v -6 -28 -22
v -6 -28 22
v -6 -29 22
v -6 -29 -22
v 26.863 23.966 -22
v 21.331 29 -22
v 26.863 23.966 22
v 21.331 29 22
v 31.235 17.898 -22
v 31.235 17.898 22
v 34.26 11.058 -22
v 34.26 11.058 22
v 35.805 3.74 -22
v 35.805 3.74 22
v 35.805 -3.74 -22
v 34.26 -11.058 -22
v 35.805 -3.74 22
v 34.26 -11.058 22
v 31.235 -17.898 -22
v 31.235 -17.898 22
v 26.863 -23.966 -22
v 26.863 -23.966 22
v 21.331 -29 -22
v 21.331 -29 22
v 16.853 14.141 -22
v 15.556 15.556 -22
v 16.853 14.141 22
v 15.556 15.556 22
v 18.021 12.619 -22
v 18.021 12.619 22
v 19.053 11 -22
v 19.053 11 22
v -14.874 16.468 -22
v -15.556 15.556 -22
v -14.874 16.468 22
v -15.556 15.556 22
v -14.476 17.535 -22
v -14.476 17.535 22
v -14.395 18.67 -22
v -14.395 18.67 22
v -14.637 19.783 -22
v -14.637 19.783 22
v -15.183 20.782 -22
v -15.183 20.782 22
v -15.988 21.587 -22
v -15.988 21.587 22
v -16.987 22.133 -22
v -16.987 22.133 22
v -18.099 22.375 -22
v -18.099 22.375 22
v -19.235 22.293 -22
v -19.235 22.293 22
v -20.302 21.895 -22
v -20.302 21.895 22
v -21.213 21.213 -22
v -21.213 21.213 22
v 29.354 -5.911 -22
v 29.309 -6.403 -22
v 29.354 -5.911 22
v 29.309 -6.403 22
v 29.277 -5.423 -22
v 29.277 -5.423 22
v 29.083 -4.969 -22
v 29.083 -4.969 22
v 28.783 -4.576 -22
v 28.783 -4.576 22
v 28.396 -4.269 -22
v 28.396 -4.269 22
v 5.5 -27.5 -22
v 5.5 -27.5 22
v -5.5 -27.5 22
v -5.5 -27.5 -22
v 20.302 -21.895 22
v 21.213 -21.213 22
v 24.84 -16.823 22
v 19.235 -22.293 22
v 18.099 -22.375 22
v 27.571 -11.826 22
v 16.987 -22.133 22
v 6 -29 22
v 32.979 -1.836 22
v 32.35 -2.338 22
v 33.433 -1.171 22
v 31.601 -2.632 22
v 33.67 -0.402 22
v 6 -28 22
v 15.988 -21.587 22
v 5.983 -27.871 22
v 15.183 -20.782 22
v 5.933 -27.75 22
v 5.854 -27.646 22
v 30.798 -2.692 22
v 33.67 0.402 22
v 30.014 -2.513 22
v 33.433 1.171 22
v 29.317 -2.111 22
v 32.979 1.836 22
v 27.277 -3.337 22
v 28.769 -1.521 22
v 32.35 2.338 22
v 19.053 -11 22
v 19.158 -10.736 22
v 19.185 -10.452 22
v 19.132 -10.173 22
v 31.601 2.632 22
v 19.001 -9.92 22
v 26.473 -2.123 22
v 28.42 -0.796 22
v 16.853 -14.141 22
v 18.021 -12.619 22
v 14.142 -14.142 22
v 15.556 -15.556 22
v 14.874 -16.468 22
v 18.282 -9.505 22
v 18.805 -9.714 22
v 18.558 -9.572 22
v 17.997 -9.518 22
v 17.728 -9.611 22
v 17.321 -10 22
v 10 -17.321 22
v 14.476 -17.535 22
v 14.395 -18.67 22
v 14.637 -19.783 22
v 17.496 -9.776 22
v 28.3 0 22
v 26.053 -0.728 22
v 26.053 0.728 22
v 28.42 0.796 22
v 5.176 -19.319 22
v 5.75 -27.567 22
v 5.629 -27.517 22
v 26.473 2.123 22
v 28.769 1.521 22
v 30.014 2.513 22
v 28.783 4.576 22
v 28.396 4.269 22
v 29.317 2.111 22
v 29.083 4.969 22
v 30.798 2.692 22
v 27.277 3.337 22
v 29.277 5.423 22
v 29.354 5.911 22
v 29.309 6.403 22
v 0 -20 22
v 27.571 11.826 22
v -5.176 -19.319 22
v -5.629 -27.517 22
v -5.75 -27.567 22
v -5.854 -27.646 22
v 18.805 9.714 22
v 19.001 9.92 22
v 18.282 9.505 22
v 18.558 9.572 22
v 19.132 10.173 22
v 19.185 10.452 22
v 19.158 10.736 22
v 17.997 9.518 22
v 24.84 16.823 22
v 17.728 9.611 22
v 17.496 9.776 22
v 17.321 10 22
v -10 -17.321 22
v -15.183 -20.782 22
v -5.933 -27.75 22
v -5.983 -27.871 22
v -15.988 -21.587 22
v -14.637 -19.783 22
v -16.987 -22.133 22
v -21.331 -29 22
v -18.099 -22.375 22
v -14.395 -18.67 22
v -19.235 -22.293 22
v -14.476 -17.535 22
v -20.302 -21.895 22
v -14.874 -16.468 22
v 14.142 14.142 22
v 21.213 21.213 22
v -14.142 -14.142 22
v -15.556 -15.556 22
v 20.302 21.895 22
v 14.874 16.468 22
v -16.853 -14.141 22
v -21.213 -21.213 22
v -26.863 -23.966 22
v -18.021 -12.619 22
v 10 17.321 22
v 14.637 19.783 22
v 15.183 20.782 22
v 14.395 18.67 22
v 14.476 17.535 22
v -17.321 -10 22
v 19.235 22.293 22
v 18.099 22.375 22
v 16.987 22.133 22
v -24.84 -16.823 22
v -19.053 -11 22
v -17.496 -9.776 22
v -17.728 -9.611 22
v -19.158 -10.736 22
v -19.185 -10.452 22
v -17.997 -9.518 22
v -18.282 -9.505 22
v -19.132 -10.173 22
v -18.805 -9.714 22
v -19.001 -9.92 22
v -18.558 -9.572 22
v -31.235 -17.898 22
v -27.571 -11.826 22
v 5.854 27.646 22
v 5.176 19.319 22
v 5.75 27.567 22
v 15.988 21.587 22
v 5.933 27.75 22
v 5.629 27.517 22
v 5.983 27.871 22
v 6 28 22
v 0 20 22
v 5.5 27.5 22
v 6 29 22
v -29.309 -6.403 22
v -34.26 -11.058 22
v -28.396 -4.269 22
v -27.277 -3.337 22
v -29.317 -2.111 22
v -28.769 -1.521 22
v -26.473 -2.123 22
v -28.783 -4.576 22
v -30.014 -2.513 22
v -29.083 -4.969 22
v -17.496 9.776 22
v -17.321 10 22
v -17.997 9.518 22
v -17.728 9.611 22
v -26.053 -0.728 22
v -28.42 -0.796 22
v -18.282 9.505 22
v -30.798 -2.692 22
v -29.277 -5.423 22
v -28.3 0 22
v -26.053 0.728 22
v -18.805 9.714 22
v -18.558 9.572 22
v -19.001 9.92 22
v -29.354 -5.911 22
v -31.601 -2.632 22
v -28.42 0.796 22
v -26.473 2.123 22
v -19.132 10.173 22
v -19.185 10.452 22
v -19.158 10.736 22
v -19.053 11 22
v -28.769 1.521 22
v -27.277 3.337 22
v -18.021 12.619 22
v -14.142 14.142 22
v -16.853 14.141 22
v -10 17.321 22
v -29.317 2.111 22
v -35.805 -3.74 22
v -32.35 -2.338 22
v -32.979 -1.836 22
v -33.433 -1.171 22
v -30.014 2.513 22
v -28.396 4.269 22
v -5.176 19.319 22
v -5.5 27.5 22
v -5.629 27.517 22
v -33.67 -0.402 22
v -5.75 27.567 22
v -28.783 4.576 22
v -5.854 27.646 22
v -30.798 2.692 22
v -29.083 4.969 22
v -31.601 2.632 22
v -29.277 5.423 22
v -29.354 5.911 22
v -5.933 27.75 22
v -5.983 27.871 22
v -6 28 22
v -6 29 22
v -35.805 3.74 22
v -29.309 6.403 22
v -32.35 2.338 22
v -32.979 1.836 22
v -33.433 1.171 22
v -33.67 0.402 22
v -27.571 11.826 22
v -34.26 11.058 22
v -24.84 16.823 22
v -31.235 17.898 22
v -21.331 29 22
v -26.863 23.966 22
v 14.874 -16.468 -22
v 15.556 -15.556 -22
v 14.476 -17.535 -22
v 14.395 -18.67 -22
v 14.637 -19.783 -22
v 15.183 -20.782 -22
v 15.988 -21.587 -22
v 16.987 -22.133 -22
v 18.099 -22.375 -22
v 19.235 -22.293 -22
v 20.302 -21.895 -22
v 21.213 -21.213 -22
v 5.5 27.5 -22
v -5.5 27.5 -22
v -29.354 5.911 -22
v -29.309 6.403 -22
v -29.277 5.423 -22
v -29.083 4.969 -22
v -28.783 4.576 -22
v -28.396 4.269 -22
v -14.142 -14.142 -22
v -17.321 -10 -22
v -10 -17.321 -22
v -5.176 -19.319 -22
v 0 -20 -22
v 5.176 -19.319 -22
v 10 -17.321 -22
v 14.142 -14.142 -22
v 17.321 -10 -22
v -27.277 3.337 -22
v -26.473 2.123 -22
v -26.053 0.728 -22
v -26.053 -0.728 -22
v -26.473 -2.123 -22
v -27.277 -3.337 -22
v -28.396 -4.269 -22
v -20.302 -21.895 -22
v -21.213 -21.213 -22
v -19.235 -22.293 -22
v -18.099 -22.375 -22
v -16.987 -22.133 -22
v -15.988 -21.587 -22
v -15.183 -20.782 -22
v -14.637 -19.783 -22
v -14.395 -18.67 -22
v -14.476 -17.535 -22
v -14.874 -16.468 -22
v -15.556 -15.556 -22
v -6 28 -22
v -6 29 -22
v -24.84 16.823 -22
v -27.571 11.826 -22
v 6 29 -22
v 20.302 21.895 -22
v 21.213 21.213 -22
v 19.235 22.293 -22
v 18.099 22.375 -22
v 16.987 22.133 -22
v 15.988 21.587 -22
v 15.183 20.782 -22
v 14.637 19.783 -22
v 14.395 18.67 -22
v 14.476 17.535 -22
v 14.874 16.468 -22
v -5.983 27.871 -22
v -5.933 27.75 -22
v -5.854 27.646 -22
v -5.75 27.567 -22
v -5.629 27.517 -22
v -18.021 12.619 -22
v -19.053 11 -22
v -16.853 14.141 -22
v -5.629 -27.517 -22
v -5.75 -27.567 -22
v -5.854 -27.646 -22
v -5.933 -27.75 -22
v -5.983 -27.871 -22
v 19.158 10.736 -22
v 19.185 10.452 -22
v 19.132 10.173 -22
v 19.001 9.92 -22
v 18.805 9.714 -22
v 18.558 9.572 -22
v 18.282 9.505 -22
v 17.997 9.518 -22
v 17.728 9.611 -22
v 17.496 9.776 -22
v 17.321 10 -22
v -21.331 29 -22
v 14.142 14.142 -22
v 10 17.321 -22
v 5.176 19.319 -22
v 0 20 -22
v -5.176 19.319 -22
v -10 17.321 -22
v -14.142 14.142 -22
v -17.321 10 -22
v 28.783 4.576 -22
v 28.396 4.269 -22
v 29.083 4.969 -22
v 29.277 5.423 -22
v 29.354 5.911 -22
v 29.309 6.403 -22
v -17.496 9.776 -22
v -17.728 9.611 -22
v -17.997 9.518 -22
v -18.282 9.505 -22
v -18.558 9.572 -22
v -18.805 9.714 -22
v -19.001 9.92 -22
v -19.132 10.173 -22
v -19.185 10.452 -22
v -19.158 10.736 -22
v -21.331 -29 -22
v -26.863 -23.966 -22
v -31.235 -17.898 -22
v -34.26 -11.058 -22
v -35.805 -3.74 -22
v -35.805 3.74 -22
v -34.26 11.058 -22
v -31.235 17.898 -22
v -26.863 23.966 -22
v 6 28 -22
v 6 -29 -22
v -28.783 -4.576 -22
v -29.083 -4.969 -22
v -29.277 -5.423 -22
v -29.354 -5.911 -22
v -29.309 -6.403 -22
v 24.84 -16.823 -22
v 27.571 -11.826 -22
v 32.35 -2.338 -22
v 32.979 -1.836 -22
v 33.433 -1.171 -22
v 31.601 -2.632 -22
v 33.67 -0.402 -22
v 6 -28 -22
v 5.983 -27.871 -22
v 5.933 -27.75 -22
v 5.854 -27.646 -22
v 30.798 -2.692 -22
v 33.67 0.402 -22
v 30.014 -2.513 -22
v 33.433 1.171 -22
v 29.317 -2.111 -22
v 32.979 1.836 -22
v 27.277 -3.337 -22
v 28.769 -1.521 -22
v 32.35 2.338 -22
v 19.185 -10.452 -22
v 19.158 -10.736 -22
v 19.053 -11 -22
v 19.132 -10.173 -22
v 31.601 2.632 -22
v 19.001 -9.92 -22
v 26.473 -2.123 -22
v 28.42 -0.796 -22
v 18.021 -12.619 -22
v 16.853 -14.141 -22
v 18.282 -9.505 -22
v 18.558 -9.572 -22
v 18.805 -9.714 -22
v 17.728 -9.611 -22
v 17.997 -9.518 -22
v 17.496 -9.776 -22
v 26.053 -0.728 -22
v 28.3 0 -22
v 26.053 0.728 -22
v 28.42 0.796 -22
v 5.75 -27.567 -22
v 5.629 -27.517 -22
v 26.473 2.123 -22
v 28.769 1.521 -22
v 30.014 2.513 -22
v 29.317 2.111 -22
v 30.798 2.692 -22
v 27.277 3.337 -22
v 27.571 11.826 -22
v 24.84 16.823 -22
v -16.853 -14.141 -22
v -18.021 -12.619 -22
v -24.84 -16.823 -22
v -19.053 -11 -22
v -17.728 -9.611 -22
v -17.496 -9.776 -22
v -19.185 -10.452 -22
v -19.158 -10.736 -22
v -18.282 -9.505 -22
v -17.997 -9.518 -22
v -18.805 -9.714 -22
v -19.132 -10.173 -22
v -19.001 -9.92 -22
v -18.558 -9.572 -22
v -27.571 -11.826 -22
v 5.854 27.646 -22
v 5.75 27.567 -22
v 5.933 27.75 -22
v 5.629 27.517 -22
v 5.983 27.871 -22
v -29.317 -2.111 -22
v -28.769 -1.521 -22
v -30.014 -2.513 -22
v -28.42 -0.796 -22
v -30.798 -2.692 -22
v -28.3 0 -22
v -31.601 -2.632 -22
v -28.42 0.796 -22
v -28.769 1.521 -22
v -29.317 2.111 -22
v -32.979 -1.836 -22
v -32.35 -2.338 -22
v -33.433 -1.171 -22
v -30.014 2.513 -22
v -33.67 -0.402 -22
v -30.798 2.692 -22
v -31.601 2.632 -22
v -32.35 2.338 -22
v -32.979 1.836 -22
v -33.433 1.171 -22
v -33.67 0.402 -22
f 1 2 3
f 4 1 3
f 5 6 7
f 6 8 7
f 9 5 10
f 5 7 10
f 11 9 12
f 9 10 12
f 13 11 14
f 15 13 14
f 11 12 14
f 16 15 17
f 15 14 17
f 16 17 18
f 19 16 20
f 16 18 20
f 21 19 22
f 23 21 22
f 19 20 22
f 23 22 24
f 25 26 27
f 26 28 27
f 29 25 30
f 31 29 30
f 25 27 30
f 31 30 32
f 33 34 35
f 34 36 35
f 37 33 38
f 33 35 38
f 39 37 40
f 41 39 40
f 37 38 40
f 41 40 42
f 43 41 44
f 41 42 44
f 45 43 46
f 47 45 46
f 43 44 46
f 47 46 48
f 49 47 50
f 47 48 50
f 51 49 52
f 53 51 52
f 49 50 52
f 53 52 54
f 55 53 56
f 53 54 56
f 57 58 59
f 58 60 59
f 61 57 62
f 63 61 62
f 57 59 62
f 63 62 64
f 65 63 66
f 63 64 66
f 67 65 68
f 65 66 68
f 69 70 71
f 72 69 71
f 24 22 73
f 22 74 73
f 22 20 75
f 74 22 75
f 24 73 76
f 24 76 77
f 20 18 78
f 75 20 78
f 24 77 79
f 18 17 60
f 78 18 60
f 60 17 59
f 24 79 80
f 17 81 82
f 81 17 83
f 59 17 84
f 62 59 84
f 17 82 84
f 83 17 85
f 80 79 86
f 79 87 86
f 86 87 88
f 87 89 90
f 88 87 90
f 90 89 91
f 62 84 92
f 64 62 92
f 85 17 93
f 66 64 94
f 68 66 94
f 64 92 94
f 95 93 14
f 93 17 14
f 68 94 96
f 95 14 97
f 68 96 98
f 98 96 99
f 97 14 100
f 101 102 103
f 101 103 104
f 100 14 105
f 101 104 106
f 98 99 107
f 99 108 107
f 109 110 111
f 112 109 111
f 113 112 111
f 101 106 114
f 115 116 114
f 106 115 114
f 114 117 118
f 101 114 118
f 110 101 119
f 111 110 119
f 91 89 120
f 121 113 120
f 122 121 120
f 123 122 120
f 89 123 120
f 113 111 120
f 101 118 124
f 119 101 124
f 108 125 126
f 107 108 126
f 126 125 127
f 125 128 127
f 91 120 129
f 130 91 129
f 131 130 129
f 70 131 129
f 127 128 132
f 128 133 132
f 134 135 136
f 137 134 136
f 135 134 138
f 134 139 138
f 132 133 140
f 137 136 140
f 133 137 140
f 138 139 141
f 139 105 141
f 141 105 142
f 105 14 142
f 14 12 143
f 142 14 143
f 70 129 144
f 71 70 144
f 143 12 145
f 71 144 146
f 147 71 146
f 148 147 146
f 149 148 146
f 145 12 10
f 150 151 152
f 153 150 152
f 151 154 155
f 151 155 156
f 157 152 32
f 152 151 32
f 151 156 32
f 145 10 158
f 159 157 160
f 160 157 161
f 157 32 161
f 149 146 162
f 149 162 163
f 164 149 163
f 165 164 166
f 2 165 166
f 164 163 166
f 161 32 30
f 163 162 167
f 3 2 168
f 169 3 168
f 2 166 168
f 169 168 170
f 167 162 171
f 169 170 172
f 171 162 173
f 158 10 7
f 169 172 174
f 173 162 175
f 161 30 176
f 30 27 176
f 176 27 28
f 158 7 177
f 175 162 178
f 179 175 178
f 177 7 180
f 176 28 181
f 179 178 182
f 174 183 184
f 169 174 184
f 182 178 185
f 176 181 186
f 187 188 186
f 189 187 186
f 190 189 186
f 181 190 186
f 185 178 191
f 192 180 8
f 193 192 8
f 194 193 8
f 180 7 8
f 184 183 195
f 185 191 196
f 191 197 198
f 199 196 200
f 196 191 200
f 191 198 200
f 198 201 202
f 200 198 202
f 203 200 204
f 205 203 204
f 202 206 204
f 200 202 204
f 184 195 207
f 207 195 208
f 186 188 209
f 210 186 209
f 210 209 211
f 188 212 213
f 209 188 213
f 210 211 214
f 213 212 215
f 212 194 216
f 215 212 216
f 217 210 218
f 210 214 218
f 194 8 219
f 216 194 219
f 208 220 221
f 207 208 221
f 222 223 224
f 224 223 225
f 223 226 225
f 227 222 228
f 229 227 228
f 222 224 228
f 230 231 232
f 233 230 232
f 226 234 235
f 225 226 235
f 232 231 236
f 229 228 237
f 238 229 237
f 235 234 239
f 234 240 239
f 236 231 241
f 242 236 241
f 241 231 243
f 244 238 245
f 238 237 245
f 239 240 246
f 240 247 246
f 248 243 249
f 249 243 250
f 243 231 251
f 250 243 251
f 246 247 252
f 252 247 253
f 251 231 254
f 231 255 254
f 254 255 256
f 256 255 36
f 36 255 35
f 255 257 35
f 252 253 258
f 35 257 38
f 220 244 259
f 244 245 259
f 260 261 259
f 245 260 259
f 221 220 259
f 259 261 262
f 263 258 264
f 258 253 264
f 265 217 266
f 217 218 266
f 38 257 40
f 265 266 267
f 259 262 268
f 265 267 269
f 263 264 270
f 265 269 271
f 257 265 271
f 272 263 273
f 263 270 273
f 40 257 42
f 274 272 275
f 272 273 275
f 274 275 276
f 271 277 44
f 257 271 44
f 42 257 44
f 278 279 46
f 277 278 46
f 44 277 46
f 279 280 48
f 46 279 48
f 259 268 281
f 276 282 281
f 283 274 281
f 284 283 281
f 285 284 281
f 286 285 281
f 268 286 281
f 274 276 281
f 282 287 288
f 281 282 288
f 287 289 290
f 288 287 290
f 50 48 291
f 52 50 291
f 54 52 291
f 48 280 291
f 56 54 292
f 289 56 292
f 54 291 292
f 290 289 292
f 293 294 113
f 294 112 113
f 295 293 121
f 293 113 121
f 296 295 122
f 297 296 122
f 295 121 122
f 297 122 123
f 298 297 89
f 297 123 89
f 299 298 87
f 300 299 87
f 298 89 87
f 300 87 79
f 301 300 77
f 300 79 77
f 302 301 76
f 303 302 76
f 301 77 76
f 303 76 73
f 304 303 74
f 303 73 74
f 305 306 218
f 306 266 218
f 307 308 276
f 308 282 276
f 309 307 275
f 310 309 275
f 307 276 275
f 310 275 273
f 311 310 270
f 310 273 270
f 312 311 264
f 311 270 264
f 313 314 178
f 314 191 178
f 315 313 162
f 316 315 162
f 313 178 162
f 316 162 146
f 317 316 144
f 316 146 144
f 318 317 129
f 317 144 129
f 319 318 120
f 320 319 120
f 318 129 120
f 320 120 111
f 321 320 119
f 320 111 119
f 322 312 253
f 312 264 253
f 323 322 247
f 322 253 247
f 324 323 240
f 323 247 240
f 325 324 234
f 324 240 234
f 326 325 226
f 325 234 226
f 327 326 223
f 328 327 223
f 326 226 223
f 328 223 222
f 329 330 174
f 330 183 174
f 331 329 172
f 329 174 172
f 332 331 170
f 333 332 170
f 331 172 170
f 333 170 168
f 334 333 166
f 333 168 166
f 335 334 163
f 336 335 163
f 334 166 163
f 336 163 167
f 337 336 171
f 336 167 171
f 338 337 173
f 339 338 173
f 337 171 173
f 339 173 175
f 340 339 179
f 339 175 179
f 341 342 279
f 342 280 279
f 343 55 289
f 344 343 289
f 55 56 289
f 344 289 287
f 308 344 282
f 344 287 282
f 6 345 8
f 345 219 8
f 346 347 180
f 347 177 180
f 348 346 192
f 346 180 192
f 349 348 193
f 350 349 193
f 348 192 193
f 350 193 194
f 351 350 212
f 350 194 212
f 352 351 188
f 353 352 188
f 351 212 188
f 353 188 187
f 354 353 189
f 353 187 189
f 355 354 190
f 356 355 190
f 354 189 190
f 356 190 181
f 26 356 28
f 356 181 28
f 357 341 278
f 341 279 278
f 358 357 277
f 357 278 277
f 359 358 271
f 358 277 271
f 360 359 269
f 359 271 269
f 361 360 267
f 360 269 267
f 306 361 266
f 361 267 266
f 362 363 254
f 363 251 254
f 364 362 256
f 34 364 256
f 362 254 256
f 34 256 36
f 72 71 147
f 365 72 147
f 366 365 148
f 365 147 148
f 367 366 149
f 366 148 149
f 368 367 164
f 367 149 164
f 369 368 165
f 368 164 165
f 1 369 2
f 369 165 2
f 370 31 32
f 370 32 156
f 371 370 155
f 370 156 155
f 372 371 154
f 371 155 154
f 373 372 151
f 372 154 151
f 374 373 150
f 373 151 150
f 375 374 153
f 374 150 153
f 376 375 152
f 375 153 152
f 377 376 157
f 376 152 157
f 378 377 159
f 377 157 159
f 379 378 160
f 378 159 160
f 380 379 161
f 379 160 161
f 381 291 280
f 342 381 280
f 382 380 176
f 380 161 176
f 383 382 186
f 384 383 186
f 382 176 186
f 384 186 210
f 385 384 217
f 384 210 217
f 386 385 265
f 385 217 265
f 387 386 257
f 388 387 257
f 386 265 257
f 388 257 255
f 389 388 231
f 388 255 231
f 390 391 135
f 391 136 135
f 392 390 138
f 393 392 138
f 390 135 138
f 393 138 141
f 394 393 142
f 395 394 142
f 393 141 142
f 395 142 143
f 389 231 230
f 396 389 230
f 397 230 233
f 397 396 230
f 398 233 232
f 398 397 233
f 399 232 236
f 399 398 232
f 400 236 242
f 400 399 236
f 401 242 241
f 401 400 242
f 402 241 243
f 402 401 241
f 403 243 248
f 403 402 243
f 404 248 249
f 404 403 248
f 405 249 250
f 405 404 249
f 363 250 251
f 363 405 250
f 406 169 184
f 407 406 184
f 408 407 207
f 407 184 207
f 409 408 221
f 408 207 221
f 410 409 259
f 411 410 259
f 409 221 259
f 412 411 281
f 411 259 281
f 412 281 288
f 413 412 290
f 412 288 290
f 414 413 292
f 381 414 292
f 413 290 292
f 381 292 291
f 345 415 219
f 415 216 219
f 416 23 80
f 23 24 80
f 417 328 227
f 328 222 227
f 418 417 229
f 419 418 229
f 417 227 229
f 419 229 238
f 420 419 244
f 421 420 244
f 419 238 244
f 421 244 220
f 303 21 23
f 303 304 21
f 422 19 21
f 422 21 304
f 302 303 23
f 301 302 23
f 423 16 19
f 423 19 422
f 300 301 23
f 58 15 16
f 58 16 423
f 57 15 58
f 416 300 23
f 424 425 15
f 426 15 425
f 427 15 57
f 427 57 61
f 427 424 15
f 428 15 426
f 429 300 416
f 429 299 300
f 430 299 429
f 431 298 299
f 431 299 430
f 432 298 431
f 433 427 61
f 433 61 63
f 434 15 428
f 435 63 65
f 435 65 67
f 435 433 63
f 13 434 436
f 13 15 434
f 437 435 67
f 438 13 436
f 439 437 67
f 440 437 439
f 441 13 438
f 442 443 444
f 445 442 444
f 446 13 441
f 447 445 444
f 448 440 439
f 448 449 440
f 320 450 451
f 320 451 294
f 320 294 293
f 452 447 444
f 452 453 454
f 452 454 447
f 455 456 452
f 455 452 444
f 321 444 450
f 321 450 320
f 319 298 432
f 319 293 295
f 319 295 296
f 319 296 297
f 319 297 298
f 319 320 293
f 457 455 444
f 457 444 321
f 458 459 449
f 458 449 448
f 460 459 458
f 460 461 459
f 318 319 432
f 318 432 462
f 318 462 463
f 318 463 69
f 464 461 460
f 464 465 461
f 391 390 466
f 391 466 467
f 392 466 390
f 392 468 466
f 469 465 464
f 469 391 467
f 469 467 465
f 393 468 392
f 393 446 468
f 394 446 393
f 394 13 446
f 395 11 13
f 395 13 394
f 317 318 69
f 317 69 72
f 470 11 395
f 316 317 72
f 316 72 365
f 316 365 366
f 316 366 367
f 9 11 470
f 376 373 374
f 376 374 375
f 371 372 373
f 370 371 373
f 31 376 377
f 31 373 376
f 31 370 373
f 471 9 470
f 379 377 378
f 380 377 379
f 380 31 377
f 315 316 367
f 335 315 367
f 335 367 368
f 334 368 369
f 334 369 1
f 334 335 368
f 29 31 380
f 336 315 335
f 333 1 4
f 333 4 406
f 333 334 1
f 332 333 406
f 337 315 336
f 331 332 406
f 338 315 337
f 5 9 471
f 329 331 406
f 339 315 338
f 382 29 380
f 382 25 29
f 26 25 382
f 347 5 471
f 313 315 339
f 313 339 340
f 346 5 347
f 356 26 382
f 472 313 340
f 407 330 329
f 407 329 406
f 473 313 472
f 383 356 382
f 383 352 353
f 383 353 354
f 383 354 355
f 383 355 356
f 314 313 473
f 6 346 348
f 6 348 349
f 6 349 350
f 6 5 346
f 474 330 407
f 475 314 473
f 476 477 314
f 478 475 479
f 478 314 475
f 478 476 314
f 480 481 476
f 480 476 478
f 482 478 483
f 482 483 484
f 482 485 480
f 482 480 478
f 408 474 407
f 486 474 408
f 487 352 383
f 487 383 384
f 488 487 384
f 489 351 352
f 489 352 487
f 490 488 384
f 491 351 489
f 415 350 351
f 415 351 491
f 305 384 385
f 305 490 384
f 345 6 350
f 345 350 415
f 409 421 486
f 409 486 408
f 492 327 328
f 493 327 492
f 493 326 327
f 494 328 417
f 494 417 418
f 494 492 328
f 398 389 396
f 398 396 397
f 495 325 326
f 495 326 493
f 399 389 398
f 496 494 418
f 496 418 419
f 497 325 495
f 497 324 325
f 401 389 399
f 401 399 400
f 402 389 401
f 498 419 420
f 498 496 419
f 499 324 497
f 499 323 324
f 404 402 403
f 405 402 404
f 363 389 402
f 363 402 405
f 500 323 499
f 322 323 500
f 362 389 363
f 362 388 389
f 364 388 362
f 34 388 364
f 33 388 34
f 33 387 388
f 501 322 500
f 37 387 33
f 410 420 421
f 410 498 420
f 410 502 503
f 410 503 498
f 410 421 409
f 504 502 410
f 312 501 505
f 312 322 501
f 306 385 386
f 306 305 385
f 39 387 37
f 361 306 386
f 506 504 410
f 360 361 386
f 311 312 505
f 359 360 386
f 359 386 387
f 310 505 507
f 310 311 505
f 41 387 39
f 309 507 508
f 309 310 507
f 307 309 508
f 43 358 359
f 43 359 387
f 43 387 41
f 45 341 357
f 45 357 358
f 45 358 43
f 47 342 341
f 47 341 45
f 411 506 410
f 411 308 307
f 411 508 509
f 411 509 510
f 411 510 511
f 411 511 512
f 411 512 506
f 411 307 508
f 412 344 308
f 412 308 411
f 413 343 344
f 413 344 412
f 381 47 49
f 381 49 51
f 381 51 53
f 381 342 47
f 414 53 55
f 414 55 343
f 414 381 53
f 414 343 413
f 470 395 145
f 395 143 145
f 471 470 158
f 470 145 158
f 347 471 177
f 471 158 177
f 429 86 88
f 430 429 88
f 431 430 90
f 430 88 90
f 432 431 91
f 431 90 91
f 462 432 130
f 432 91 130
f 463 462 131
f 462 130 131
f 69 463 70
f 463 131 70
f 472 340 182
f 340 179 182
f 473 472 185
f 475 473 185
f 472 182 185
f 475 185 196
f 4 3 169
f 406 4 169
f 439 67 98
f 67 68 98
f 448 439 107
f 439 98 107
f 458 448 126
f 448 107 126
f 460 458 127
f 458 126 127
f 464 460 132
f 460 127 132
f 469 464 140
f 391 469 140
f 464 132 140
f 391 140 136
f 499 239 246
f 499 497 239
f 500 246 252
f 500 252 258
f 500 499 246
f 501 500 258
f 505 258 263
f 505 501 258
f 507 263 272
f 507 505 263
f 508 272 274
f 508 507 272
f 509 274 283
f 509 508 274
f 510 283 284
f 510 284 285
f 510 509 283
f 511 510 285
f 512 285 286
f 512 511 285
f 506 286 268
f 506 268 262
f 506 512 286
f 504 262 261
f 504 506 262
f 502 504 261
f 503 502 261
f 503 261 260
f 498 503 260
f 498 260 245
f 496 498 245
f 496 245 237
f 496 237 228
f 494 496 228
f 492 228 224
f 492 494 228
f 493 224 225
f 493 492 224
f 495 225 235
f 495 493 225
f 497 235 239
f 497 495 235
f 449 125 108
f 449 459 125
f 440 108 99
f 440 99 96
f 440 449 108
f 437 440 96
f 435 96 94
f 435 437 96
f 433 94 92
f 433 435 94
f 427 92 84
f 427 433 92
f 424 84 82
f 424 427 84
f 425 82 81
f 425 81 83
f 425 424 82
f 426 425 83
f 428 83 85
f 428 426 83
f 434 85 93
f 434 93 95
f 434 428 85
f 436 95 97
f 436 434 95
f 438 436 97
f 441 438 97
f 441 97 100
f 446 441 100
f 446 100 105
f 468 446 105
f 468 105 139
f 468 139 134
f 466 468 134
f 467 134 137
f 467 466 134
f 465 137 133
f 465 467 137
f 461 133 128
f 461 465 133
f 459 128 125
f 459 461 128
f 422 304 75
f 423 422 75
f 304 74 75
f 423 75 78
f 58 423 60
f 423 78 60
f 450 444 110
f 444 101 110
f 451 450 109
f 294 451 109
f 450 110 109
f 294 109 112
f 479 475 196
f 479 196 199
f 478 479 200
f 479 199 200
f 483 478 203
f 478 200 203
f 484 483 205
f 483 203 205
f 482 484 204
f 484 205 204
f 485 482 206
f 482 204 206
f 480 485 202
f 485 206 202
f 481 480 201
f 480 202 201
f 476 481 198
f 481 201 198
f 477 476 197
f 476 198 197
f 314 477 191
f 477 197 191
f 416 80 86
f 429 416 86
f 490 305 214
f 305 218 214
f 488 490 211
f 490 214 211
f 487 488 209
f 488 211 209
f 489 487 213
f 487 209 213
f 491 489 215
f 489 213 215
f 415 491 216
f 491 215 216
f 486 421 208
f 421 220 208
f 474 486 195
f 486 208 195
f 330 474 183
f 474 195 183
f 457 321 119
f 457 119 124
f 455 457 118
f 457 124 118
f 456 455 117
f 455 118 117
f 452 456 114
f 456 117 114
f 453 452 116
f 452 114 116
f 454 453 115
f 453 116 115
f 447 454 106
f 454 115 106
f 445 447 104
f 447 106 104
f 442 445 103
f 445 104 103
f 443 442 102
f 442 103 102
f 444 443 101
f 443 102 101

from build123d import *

# Parameters (mm, degrees)
ESQUISSE1_R      = 2.7
EXTRUSION1_DEPTH = 22


with BuildPart() as part:
    # Esquisse1 → Extrusion1 (new, symmetric)
    with BuildSketch(Plane.XY):
        with BuildLine():
            Line((-21.330729008, 29), (-6, 29))
            Line((-6, 29), (-6, 28))
            ThreePointArc((-6, 28), (-5.853553391, 27.646446609), (-5.5, 27.5))
            Line((-5.5, 27.5), (5.5, 27.5))
            ThreePointArc((5.5, 27.5), (5.853553391, 27.646446609), (6, 28))
            Line((6, 28), (6, 29))
            Line((6, 29), (21.330729008, 29))
            ThreePointArc((21.330729008, 29), (36, 0), (21.330729008, -29))
            Line((21.330729008, -29), (6, -29))
            Line((6, -29), (6, -28))
            ThreePointArc((6, -28), (5.853553391, -27.646446609), (5.5, -27.5))
            Line((5.5, -27.5), (-5.5, -27.5))
            ThreePointArc((-5.5, -27.5), (-5.853553391, -27.646446609), (-6, -28))
            Line((-6, -28), (-6, -29))
            Line((-6, -29), (-21.330729008, -29))
            ThreePointArc((-21.330729008, -29), (-36, 0), (-21.330729008, 29))
        make_face()
        with Locations((-31, 0)):
            Circle(ESQUISSE1_R, mode=Mode.SUBTRACT)
        with Locations((31, 0)):
            Circle(ESQUISSE1_R, mode=Mode.SUBTRACT)
        with BuildLine():
            ThreePointArc((-17.320508076, 10), (-18.686533479, 9.633974596), (-19.052558883, 11))
            ThreePointArc((-19.052558883, 11), (-17.453773486, 13.392751438), (-15.556349186, 15.556349186))
            ThreePointArc((-15.556349186, 15.556349186), (-15.556349186, 21.213203436), (-21.213203436, 21.213203436))
            ThreePointArc((-21.213203436, 21.213203436), (-26.32401055, 14.389109374), (-29.30875576, 6.402877149))
            ThreePointArc((-29.30875576, 6.402877149), (-29.193831331, 5.189821407), (-28.396313364, 4.268584766))
            ThreePointArc((-28.396313364, 4.268584766), (-26, 0), (-28.396313364, -4.268584766))
            ThreePointArc((-28.396313364, -4.268584766), (-29.193831331, -5.189821407), (-29.30875576, -6.402877149))
            ThreePointArc((-29.30875576, -6.402877149), (-26.32401055, -14.389109374), (-21.213203436, -21.213203436))
            ThreePointArc((-21.213203436, -21.213203436), (-15.556349186, -21.213203436), (-15.556349186, -15.556349186))
            ThreePointArc((-15.556349186, -15.556349186), (-17.453773486, -13.392751438), (-19.052558883, -11))
            ThreePointArc((-19.052558883, -11), (-18.686533479, -9.633974596), (-17.320508076, -10))
            ThreePointArc((-17.320508076, -10), (0, -20), (17.320508076, -10))
            ThreePointArc((17.320508076, -10), (18.686533479, -9.633974596), (19.052558883, -11))
            ThreePointArc((19.052558883, -11), (17.453773486, -13.392751438), (15.556349186, -15.556349186))
            ThreePointArc((15.556349186, -15.556349186), (15.556349186, -21.213203436), (21.213203436, -21.213203436))
            ThreePointArc((21.213203436, -21.213203436), (26.32401055, -14.389109374), (29.30875576, -6.402877149))
            ThreePointArc((29.30875576, -6.402877149), (29.193831331, -5.189821407), (28.396313364, -4.268584766))
            ThreePointArc((28.396313364, -4.268584766), (26, 0), (28.396313364, 4.268584766))
            ThreePointArc((28.396313364, 4.268584766), (29.193831331, 5.189821407), (29.30875576, 6.402877149))
            ThreePointArc((29.30875576, 6.402877149), (26.32401055, 14.389109374), (21.213203436, 21.213203436))
            ThreePointArc((21.213203436, 21.213203436), (15.556349186, 21.213203436), (15.556349186, 15.556349186))
            ThreePointArc((15.556349186, 15.556349186), (17.453773486, 13.392751438), (19.052558883, 11))
            ThreePointArc((19.052558883, 11), (18.686533479, 9.633974596), (17.320508076, 10))
            ThreePointArc((17.320508076, 10), (0, 20), (-17.320508076, 10))
        make_face(mode=Mode.SUBTRACT)
    extrude(amount=EXTRUSION1_DEPTH, both=True)


solid = part.part
